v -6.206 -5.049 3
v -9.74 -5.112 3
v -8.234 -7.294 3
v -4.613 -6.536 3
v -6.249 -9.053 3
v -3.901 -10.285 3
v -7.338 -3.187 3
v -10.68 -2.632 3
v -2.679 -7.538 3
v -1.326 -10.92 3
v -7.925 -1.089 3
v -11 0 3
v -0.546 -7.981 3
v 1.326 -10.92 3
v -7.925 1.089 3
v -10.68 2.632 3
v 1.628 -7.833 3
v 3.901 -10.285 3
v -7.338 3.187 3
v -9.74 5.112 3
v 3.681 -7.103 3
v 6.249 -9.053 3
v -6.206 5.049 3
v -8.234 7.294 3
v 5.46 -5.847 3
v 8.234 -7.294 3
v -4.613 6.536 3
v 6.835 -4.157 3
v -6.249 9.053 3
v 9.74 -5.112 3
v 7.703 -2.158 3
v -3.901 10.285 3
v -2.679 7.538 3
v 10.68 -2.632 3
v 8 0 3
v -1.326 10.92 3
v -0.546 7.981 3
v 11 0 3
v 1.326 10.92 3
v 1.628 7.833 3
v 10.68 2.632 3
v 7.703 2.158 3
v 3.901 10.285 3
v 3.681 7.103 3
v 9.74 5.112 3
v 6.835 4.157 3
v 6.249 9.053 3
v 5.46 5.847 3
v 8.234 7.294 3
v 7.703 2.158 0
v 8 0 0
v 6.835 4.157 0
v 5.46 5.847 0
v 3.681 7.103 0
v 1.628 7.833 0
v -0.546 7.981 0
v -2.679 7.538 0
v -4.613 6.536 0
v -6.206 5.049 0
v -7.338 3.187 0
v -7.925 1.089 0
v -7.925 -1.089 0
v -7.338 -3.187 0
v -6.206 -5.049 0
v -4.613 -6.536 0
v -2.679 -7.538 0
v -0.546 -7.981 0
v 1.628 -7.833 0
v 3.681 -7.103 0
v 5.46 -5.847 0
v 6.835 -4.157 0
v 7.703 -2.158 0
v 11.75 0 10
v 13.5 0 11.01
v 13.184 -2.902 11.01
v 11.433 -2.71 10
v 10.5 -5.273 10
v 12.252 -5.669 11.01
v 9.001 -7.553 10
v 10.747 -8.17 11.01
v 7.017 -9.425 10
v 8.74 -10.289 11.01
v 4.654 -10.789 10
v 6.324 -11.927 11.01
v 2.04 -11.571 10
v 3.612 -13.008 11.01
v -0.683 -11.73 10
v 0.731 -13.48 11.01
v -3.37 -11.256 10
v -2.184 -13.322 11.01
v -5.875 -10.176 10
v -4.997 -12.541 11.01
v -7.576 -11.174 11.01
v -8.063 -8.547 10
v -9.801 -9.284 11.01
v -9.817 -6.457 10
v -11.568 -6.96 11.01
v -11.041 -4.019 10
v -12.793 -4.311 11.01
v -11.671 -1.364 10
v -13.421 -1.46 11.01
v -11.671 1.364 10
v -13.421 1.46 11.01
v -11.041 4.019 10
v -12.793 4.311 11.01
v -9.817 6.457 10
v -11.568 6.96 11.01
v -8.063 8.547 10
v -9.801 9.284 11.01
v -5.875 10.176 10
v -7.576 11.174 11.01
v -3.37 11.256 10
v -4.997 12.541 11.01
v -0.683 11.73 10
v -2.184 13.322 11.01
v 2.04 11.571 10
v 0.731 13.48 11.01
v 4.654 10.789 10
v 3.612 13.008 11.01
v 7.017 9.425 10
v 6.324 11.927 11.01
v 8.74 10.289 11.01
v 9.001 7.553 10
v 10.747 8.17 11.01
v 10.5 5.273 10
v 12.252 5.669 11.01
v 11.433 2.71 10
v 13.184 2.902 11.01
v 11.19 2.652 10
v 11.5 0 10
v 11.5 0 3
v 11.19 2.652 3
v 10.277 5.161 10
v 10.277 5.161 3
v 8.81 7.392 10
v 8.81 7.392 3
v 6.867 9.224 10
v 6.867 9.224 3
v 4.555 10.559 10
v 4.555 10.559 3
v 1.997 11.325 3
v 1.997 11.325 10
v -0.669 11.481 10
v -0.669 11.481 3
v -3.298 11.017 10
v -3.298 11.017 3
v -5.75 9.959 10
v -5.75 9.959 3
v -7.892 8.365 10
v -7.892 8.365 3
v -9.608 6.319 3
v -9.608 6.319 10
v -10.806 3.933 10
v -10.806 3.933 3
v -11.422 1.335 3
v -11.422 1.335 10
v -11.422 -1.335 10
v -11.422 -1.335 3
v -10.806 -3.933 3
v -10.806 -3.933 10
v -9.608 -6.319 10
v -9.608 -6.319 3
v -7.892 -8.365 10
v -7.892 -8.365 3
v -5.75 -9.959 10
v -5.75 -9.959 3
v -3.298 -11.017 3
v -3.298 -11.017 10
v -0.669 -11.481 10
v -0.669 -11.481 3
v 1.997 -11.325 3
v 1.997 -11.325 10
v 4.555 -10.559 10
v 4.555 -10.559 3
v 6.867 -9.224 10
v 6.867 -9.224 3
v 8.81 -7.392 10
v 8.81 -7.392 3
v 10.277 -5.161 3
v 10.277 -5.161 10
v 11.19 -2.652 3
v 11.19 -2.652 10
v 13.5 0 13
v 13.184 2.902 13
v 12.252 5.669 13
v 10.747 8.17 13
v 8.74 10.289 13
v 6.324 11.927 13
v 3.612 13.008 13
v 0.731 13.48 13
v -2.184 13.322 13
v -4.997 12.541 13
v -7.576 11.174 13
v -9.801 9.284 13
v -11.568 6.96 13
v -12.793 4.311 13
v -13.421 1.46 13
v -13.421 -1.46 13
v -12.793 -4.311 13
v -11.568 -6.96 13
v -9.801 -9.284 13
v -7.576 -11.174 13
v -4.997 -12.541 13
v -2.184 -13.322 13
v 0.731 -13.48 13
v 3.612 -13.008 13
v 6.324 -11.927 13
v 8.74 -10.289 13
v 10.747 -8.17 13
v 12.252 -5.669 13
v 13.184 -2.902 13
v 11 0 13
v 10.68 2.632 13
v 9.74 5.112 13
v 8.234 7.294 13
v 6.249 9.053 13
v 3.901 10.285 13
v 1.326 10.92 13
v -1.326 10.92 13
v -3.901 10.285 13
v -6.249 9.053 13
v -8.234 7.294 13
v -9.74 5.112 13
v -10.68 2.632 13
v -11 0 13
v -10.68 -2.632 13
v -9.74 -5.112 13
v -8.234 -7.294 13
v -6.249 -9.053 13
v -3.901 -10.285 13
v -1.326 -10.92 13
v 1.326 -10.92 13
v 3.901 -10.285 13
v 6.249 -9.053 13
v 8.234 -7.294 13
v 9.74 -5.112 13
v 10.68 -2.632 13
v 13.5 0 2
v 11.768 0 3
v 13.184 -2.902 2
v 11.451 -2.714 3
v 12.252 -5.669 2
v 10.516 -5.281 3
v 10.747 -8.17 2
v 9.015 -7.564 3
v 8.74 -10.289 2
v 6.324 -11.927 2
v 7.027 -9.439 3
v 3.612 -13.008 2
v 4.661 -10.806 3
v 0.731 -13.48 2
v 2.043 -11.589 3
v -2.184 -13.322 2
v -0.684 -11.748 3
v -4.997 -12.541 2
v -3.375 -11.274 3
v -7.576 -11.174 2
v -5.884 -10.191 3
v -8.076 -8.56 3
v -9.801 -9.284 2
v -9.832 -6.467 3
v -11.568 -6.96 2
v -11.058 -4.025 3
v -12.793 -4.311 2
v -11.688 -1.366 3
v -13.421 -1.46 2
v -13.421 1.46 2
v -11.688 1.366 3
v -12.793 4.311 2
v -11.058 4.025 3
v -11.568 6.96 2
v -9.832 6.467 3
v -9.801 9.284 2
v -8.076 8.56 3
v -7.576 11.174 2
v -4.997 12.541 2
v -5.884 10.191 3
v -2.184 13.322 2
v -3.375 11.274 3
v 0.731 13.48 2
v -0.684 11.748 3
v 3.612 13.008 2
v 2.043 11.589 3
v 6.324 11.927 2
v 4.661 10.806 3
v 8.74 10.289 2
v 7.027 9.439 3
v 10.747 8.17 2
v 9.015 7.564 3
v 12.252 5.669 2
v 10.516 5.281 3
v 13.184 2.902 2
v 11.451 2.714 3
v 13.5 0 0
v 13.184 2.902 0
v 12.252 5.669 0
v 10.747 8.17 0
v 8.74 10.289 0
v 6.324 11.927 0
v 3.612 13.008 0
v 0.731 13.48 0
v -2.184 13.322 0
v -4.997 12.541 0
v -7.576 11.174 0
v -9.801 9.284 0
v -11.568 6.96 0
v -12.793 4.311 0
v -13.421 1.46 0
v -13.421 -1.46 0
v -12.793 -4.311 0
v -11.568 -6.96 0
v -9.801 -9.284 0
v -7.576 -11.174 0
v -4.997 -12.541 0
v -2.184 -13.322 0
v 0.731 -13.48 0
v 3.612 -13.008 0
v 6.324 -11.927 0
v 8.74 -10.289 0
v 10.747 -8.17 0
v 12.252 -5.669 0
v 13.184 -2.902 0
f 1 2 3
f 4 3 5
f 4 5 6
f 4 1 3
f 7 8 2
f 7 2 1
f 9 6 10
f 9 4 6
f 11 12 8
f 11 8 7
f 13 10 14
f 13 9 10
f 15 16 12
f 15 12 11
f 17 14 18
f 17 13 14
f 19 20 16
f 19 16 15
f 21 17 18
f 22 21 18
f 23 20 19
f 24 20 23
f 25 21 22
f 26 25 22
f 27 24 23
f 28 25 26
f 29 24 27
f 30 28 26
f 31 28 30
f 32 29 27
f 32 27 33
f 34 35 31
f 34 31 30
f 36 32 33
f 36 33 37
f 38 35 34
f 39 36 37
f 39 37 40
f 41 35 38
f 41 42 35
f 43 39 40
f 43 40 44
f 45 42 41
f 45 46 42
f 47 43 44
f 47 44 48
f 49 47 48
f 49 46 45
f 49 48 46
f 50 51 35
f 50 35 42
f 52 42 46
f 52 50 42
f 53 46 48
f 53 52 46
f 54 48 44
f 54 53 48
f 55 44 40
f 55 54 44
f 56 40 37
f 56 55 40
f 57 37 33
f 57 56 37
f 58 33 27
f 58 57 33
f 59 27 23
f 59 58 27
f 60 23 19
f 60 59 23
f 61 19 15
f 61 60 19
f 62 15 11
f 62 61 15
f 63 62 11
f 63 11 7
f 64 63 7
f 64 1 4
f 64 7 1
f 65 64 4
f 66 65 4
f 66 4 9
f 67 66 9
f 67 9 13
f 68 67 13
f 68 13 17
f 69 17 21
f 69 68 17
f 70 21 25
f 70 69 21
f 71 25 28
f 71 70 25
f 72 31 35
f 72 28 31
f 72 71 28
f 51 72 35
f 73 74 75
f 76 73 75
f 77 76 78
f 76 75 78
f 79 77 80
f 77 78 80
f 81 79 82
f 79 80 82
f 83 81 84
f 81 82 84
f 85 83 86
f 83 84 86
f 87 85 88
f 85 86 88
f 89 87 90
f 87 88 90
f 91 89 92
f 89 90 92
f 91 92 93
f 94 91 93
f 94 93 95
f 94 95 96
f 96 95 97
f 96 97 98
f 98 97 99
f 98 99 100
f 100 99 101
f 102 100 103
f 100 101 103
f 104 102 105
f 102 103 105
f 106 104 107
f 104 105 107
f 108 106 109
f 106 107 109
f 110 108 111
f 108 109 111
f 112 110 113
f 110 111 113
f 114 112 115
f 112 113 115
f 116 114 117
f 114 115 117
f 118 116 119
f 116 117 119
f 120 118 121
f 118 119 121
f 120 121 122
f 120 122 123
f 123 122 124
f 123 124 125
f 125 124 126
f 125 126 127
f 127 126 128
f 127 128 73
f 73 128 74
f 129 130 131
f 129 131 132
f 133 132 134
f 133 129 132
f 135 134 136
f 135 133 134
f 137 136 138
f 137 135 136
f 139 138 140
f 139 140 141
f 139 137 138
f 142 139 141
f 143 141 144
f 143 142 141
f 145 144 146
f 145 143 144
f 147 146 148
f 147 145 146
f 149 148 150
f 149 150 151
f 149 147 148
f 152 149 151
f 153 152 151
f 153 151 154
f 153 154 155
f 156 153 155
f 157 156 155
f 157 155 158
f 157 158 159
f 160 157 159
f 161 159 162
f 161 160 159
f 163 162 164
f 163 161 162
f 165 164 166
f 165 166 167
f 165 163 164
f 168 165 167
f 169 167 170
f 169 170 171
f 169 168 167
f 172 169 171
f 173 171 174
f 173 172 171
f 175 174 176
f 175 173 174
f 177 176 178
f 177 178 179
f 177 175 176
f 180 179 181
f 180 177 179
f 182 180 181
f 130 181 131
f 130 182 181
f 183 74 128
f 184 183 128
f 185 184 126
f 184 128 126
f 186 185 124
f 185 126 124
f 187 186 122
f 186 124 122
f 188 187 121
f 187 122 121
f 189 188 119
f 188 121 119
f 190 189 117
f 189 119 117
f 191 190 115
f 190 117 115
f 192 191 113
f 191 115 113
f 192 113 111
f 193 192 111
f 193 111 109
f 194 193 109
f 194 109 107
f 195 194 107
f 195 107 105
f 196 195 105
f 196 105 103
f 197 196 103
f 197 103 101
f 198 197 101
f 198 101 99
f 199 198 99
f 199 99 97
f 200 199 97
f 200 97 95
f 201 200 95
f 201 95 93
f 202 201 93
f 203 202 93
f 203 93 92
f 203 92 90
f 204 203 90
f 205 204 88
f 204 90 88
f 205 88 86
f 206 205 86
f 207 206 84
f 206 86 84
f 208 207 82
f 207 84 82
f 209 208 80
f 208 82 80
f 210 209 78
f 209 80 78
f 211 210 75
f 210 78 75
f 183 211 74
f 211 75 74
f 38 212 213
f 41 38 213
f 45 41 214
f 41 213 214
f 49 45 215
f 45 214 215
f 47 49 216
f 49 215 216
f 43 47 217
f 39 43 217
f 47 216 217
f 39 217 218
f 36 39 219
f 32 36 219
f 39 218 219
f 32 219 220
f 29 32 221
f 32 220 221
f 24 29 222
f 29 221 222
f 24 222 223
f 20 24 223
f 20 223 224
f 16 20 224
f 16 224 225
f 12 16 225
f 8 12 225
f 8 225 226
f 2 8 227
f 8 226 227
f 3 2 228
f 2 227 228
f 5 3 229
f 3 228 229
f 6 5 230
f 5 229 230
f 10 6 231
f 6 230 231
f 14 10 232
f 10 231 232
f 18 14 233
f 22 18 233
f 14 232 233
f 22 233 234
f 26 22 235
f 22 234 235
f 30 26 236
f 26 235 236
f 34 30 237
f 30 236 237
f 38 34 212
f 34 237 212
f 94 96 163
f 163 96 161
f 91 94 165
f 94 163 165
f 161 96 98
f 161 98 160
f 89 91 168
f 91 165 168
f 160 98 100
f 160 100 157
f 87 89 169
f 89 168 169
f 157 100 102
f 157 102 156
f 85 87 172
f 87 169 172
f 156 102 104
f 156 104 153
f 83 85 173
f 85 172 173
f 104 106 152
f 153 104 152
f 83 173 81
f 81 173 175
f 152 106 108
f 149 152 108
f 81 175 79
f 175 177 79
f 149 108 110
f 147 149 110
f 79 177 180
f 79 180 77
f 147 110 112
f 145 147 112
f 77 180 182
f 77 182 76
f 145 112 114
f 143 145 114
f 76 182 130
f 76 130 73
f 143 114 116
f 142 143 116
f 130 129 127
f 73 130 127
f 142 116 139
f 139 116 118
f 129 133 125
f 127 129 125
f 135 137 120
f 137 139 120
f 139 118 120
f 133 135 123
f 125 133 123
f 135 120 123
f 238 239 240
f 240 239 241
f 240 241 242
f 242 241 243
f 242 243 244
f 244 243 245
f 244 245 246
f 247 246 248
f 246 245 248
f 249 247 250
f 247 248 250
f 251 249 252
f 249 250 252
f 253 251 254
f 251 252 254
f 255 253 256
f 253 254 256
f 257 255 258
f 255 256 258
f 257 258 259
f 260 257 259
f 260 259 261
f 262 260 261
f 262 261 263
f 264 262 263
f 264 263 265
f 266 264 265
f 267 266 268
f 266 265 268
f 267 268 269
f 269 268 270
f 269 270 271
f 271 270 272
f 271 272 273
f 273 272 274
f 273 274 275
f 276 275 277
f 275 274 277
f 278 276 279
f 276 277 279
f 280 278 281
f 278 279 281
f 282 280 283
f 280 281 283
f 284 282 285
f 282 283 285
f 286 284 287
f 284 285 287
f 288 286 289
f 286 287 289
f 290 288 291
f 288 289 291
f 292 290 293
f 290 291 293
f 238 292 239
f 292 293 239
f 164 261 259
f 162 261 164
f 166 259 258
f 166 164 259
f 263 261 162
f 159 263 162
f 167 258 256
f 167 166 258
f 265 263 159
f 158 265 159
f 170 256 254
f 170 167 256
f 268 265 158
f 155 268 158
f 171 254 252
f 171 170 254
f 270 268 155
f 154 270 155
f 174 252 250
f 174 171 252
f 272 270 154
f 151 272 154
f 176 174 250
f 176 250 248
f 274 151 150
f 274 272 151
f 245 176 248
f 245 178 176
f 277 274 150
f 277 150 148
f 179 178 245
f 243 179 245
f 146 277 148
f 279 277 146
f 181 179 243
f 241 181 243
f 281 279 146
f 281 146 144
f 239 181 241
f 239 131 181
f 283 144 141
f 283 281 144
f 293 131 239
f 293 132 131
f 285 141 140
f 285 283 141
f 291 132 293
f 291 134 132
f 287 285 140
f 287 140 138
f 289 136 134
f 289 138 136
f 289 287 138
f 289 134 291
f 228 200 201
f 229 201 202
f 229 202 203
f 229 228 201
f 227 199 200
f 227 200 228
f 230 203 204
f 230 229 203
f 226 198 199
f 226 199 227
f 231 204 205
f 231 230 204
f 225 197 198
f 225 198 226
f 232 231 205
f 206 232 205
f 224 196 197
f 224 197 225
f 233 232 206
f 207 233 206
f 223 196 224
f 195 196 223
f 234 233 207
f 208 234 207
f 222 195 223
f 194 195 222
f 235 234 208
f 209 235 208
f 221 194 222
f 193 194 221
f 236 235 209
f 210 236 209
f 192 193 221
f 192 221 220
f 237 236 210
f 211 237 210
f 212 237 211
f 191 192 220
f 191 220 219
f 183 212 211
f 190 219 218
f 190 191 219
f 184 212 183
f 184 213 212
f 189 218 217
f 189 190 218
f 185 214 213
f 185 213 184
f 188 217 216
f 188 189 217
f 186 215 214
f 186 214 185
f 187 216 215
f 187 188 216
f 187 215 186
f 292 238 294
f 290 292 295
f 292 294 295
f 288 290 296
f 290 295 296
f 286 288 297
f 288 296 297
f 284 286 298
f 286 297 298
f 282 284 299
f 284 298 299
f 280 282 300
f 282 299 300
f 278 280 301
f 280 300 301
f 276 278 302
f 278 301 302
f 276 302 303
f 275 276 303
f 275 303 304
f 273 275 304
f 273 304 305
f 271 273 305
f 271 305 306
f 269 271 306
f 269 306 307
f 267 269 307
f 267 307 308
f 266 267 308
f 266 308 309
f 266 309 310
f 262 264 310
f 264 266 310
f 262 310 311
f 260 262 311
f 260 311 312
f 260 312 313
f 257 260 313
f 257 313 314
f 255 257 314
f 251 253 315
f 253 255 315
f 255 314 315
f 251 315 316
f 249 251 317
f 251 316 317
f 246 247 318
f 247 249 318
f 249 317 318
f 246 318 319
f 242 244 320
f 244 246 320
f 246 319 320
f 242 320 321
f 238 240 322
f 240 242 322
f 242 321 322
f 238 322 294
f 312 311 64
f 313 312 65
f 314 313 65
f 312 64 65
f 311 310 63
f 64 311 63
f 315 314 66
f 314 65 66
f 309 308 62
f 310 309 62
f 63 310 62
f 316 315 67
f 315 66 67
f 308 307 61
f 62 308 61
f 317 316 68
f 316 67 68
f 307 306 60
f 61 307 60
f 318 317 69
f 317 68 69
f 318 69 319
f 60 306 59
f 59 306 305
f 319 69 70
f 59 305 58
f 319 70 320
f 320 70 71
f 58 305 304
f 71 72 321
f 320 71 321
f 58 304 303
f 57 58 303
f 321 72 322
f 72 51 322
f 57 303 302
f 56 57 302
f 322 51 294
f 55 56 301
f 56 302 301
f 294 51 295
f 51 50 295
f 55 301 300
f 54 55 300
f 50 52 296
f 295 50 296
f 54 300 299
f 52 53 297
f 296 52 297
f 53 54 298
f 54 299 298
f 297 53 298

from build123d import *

# Parameters (mm, degrees)
SKETCH1_R           = 13.5
SKETCH1_R_2         = 8
BOSS_EXTRUDE1_DEPTH = 13
SKETCH2_R           = 11
CUT_EXTRUDE1_DEPTH  = 10
CUT_EXTRUDE2_START  = -3
SKETCH3_OUTSIDE_W   = 37.068
SKETCH3_OUTSIDE_H   = 37.068
SKETCH3_OUTSIDE_R   = 11.5
CUT_EXTRUDE2_DEPTH  = 7
CHAMFER1_SIZE       = 1.75
CHAMFER1_SIZE2      = 1.010362971
CHAMFER2_SIZE       = 1
CHAMFER2_SIZE2      = 1.732050808


with BuildPart() as part:
    # Sketch1 → Boss-Extrude1 (new body)
    with BuildSketch(Plane.XY):
        Circle(SKETCH1_R)
        Circle(SKETCH1_R_2, mode=Mode.SUBTRACT)
    extrude(amount=BOSS_EXTRUDE1_DEPTH)

    # Sketch2 → Cut-Extrude1 (cut)
    with BuildSketch(Plane.XY.offset(13)):
        Circle(SKETCH2_R)
    extrude(amount=-CUT_EXTRUDE1_DEPTH, mode=Mode.SUBTRACT)

    # Sketch3 outside → Cut-Extrude2 (cut)
    with BuildSketch(Plane.XY.offset(13).offset(CUT_EXTRUDE2_START)):
        Rectangle(SKETCH3_OUTSIDE_W, SKETCH3_OUTSIDE_H)
        Circle(SKETCH3_OUTSIDE_R, mode=Mode.SUBTRACT)
    extrude(amount=-CUT_EXTRUDE2_DEPTH, mode=Mode.SUBTRACT)

    # Chamfer1
    chamfer1_edges = [part.edges().sort_by_distance(p)[0] for p in [
        (-13.5, 0, 10),
    ]]
    chamfer1_side = [part.faces().sort_by_distance(p)[0] for p in [
        (-13.118162338, 0, 10),
    ]]
    chamfer(chamfer1_edges, length=CHAMFER1_SIZE, length2=CHAMFER1_SIZE2, reference=chamfer1_side[0])

    # Chamfer2
    chamfer2_edges = [part.edges().sort_by_distance(p)[0] for p in [
        (-13.5, 0, 3),
    ]]
    chamfer2_side = [part.faces().sort_by_distance(p)[0] for p in [
        (-13.5, 0, 1.5),
    ]]
    chamfer(chamfer2_edges, length=CHAMFER2_SIZE, length2=CHAMFER2_SIZE2, reference=chamfer2_side[0])


solid = part.part
